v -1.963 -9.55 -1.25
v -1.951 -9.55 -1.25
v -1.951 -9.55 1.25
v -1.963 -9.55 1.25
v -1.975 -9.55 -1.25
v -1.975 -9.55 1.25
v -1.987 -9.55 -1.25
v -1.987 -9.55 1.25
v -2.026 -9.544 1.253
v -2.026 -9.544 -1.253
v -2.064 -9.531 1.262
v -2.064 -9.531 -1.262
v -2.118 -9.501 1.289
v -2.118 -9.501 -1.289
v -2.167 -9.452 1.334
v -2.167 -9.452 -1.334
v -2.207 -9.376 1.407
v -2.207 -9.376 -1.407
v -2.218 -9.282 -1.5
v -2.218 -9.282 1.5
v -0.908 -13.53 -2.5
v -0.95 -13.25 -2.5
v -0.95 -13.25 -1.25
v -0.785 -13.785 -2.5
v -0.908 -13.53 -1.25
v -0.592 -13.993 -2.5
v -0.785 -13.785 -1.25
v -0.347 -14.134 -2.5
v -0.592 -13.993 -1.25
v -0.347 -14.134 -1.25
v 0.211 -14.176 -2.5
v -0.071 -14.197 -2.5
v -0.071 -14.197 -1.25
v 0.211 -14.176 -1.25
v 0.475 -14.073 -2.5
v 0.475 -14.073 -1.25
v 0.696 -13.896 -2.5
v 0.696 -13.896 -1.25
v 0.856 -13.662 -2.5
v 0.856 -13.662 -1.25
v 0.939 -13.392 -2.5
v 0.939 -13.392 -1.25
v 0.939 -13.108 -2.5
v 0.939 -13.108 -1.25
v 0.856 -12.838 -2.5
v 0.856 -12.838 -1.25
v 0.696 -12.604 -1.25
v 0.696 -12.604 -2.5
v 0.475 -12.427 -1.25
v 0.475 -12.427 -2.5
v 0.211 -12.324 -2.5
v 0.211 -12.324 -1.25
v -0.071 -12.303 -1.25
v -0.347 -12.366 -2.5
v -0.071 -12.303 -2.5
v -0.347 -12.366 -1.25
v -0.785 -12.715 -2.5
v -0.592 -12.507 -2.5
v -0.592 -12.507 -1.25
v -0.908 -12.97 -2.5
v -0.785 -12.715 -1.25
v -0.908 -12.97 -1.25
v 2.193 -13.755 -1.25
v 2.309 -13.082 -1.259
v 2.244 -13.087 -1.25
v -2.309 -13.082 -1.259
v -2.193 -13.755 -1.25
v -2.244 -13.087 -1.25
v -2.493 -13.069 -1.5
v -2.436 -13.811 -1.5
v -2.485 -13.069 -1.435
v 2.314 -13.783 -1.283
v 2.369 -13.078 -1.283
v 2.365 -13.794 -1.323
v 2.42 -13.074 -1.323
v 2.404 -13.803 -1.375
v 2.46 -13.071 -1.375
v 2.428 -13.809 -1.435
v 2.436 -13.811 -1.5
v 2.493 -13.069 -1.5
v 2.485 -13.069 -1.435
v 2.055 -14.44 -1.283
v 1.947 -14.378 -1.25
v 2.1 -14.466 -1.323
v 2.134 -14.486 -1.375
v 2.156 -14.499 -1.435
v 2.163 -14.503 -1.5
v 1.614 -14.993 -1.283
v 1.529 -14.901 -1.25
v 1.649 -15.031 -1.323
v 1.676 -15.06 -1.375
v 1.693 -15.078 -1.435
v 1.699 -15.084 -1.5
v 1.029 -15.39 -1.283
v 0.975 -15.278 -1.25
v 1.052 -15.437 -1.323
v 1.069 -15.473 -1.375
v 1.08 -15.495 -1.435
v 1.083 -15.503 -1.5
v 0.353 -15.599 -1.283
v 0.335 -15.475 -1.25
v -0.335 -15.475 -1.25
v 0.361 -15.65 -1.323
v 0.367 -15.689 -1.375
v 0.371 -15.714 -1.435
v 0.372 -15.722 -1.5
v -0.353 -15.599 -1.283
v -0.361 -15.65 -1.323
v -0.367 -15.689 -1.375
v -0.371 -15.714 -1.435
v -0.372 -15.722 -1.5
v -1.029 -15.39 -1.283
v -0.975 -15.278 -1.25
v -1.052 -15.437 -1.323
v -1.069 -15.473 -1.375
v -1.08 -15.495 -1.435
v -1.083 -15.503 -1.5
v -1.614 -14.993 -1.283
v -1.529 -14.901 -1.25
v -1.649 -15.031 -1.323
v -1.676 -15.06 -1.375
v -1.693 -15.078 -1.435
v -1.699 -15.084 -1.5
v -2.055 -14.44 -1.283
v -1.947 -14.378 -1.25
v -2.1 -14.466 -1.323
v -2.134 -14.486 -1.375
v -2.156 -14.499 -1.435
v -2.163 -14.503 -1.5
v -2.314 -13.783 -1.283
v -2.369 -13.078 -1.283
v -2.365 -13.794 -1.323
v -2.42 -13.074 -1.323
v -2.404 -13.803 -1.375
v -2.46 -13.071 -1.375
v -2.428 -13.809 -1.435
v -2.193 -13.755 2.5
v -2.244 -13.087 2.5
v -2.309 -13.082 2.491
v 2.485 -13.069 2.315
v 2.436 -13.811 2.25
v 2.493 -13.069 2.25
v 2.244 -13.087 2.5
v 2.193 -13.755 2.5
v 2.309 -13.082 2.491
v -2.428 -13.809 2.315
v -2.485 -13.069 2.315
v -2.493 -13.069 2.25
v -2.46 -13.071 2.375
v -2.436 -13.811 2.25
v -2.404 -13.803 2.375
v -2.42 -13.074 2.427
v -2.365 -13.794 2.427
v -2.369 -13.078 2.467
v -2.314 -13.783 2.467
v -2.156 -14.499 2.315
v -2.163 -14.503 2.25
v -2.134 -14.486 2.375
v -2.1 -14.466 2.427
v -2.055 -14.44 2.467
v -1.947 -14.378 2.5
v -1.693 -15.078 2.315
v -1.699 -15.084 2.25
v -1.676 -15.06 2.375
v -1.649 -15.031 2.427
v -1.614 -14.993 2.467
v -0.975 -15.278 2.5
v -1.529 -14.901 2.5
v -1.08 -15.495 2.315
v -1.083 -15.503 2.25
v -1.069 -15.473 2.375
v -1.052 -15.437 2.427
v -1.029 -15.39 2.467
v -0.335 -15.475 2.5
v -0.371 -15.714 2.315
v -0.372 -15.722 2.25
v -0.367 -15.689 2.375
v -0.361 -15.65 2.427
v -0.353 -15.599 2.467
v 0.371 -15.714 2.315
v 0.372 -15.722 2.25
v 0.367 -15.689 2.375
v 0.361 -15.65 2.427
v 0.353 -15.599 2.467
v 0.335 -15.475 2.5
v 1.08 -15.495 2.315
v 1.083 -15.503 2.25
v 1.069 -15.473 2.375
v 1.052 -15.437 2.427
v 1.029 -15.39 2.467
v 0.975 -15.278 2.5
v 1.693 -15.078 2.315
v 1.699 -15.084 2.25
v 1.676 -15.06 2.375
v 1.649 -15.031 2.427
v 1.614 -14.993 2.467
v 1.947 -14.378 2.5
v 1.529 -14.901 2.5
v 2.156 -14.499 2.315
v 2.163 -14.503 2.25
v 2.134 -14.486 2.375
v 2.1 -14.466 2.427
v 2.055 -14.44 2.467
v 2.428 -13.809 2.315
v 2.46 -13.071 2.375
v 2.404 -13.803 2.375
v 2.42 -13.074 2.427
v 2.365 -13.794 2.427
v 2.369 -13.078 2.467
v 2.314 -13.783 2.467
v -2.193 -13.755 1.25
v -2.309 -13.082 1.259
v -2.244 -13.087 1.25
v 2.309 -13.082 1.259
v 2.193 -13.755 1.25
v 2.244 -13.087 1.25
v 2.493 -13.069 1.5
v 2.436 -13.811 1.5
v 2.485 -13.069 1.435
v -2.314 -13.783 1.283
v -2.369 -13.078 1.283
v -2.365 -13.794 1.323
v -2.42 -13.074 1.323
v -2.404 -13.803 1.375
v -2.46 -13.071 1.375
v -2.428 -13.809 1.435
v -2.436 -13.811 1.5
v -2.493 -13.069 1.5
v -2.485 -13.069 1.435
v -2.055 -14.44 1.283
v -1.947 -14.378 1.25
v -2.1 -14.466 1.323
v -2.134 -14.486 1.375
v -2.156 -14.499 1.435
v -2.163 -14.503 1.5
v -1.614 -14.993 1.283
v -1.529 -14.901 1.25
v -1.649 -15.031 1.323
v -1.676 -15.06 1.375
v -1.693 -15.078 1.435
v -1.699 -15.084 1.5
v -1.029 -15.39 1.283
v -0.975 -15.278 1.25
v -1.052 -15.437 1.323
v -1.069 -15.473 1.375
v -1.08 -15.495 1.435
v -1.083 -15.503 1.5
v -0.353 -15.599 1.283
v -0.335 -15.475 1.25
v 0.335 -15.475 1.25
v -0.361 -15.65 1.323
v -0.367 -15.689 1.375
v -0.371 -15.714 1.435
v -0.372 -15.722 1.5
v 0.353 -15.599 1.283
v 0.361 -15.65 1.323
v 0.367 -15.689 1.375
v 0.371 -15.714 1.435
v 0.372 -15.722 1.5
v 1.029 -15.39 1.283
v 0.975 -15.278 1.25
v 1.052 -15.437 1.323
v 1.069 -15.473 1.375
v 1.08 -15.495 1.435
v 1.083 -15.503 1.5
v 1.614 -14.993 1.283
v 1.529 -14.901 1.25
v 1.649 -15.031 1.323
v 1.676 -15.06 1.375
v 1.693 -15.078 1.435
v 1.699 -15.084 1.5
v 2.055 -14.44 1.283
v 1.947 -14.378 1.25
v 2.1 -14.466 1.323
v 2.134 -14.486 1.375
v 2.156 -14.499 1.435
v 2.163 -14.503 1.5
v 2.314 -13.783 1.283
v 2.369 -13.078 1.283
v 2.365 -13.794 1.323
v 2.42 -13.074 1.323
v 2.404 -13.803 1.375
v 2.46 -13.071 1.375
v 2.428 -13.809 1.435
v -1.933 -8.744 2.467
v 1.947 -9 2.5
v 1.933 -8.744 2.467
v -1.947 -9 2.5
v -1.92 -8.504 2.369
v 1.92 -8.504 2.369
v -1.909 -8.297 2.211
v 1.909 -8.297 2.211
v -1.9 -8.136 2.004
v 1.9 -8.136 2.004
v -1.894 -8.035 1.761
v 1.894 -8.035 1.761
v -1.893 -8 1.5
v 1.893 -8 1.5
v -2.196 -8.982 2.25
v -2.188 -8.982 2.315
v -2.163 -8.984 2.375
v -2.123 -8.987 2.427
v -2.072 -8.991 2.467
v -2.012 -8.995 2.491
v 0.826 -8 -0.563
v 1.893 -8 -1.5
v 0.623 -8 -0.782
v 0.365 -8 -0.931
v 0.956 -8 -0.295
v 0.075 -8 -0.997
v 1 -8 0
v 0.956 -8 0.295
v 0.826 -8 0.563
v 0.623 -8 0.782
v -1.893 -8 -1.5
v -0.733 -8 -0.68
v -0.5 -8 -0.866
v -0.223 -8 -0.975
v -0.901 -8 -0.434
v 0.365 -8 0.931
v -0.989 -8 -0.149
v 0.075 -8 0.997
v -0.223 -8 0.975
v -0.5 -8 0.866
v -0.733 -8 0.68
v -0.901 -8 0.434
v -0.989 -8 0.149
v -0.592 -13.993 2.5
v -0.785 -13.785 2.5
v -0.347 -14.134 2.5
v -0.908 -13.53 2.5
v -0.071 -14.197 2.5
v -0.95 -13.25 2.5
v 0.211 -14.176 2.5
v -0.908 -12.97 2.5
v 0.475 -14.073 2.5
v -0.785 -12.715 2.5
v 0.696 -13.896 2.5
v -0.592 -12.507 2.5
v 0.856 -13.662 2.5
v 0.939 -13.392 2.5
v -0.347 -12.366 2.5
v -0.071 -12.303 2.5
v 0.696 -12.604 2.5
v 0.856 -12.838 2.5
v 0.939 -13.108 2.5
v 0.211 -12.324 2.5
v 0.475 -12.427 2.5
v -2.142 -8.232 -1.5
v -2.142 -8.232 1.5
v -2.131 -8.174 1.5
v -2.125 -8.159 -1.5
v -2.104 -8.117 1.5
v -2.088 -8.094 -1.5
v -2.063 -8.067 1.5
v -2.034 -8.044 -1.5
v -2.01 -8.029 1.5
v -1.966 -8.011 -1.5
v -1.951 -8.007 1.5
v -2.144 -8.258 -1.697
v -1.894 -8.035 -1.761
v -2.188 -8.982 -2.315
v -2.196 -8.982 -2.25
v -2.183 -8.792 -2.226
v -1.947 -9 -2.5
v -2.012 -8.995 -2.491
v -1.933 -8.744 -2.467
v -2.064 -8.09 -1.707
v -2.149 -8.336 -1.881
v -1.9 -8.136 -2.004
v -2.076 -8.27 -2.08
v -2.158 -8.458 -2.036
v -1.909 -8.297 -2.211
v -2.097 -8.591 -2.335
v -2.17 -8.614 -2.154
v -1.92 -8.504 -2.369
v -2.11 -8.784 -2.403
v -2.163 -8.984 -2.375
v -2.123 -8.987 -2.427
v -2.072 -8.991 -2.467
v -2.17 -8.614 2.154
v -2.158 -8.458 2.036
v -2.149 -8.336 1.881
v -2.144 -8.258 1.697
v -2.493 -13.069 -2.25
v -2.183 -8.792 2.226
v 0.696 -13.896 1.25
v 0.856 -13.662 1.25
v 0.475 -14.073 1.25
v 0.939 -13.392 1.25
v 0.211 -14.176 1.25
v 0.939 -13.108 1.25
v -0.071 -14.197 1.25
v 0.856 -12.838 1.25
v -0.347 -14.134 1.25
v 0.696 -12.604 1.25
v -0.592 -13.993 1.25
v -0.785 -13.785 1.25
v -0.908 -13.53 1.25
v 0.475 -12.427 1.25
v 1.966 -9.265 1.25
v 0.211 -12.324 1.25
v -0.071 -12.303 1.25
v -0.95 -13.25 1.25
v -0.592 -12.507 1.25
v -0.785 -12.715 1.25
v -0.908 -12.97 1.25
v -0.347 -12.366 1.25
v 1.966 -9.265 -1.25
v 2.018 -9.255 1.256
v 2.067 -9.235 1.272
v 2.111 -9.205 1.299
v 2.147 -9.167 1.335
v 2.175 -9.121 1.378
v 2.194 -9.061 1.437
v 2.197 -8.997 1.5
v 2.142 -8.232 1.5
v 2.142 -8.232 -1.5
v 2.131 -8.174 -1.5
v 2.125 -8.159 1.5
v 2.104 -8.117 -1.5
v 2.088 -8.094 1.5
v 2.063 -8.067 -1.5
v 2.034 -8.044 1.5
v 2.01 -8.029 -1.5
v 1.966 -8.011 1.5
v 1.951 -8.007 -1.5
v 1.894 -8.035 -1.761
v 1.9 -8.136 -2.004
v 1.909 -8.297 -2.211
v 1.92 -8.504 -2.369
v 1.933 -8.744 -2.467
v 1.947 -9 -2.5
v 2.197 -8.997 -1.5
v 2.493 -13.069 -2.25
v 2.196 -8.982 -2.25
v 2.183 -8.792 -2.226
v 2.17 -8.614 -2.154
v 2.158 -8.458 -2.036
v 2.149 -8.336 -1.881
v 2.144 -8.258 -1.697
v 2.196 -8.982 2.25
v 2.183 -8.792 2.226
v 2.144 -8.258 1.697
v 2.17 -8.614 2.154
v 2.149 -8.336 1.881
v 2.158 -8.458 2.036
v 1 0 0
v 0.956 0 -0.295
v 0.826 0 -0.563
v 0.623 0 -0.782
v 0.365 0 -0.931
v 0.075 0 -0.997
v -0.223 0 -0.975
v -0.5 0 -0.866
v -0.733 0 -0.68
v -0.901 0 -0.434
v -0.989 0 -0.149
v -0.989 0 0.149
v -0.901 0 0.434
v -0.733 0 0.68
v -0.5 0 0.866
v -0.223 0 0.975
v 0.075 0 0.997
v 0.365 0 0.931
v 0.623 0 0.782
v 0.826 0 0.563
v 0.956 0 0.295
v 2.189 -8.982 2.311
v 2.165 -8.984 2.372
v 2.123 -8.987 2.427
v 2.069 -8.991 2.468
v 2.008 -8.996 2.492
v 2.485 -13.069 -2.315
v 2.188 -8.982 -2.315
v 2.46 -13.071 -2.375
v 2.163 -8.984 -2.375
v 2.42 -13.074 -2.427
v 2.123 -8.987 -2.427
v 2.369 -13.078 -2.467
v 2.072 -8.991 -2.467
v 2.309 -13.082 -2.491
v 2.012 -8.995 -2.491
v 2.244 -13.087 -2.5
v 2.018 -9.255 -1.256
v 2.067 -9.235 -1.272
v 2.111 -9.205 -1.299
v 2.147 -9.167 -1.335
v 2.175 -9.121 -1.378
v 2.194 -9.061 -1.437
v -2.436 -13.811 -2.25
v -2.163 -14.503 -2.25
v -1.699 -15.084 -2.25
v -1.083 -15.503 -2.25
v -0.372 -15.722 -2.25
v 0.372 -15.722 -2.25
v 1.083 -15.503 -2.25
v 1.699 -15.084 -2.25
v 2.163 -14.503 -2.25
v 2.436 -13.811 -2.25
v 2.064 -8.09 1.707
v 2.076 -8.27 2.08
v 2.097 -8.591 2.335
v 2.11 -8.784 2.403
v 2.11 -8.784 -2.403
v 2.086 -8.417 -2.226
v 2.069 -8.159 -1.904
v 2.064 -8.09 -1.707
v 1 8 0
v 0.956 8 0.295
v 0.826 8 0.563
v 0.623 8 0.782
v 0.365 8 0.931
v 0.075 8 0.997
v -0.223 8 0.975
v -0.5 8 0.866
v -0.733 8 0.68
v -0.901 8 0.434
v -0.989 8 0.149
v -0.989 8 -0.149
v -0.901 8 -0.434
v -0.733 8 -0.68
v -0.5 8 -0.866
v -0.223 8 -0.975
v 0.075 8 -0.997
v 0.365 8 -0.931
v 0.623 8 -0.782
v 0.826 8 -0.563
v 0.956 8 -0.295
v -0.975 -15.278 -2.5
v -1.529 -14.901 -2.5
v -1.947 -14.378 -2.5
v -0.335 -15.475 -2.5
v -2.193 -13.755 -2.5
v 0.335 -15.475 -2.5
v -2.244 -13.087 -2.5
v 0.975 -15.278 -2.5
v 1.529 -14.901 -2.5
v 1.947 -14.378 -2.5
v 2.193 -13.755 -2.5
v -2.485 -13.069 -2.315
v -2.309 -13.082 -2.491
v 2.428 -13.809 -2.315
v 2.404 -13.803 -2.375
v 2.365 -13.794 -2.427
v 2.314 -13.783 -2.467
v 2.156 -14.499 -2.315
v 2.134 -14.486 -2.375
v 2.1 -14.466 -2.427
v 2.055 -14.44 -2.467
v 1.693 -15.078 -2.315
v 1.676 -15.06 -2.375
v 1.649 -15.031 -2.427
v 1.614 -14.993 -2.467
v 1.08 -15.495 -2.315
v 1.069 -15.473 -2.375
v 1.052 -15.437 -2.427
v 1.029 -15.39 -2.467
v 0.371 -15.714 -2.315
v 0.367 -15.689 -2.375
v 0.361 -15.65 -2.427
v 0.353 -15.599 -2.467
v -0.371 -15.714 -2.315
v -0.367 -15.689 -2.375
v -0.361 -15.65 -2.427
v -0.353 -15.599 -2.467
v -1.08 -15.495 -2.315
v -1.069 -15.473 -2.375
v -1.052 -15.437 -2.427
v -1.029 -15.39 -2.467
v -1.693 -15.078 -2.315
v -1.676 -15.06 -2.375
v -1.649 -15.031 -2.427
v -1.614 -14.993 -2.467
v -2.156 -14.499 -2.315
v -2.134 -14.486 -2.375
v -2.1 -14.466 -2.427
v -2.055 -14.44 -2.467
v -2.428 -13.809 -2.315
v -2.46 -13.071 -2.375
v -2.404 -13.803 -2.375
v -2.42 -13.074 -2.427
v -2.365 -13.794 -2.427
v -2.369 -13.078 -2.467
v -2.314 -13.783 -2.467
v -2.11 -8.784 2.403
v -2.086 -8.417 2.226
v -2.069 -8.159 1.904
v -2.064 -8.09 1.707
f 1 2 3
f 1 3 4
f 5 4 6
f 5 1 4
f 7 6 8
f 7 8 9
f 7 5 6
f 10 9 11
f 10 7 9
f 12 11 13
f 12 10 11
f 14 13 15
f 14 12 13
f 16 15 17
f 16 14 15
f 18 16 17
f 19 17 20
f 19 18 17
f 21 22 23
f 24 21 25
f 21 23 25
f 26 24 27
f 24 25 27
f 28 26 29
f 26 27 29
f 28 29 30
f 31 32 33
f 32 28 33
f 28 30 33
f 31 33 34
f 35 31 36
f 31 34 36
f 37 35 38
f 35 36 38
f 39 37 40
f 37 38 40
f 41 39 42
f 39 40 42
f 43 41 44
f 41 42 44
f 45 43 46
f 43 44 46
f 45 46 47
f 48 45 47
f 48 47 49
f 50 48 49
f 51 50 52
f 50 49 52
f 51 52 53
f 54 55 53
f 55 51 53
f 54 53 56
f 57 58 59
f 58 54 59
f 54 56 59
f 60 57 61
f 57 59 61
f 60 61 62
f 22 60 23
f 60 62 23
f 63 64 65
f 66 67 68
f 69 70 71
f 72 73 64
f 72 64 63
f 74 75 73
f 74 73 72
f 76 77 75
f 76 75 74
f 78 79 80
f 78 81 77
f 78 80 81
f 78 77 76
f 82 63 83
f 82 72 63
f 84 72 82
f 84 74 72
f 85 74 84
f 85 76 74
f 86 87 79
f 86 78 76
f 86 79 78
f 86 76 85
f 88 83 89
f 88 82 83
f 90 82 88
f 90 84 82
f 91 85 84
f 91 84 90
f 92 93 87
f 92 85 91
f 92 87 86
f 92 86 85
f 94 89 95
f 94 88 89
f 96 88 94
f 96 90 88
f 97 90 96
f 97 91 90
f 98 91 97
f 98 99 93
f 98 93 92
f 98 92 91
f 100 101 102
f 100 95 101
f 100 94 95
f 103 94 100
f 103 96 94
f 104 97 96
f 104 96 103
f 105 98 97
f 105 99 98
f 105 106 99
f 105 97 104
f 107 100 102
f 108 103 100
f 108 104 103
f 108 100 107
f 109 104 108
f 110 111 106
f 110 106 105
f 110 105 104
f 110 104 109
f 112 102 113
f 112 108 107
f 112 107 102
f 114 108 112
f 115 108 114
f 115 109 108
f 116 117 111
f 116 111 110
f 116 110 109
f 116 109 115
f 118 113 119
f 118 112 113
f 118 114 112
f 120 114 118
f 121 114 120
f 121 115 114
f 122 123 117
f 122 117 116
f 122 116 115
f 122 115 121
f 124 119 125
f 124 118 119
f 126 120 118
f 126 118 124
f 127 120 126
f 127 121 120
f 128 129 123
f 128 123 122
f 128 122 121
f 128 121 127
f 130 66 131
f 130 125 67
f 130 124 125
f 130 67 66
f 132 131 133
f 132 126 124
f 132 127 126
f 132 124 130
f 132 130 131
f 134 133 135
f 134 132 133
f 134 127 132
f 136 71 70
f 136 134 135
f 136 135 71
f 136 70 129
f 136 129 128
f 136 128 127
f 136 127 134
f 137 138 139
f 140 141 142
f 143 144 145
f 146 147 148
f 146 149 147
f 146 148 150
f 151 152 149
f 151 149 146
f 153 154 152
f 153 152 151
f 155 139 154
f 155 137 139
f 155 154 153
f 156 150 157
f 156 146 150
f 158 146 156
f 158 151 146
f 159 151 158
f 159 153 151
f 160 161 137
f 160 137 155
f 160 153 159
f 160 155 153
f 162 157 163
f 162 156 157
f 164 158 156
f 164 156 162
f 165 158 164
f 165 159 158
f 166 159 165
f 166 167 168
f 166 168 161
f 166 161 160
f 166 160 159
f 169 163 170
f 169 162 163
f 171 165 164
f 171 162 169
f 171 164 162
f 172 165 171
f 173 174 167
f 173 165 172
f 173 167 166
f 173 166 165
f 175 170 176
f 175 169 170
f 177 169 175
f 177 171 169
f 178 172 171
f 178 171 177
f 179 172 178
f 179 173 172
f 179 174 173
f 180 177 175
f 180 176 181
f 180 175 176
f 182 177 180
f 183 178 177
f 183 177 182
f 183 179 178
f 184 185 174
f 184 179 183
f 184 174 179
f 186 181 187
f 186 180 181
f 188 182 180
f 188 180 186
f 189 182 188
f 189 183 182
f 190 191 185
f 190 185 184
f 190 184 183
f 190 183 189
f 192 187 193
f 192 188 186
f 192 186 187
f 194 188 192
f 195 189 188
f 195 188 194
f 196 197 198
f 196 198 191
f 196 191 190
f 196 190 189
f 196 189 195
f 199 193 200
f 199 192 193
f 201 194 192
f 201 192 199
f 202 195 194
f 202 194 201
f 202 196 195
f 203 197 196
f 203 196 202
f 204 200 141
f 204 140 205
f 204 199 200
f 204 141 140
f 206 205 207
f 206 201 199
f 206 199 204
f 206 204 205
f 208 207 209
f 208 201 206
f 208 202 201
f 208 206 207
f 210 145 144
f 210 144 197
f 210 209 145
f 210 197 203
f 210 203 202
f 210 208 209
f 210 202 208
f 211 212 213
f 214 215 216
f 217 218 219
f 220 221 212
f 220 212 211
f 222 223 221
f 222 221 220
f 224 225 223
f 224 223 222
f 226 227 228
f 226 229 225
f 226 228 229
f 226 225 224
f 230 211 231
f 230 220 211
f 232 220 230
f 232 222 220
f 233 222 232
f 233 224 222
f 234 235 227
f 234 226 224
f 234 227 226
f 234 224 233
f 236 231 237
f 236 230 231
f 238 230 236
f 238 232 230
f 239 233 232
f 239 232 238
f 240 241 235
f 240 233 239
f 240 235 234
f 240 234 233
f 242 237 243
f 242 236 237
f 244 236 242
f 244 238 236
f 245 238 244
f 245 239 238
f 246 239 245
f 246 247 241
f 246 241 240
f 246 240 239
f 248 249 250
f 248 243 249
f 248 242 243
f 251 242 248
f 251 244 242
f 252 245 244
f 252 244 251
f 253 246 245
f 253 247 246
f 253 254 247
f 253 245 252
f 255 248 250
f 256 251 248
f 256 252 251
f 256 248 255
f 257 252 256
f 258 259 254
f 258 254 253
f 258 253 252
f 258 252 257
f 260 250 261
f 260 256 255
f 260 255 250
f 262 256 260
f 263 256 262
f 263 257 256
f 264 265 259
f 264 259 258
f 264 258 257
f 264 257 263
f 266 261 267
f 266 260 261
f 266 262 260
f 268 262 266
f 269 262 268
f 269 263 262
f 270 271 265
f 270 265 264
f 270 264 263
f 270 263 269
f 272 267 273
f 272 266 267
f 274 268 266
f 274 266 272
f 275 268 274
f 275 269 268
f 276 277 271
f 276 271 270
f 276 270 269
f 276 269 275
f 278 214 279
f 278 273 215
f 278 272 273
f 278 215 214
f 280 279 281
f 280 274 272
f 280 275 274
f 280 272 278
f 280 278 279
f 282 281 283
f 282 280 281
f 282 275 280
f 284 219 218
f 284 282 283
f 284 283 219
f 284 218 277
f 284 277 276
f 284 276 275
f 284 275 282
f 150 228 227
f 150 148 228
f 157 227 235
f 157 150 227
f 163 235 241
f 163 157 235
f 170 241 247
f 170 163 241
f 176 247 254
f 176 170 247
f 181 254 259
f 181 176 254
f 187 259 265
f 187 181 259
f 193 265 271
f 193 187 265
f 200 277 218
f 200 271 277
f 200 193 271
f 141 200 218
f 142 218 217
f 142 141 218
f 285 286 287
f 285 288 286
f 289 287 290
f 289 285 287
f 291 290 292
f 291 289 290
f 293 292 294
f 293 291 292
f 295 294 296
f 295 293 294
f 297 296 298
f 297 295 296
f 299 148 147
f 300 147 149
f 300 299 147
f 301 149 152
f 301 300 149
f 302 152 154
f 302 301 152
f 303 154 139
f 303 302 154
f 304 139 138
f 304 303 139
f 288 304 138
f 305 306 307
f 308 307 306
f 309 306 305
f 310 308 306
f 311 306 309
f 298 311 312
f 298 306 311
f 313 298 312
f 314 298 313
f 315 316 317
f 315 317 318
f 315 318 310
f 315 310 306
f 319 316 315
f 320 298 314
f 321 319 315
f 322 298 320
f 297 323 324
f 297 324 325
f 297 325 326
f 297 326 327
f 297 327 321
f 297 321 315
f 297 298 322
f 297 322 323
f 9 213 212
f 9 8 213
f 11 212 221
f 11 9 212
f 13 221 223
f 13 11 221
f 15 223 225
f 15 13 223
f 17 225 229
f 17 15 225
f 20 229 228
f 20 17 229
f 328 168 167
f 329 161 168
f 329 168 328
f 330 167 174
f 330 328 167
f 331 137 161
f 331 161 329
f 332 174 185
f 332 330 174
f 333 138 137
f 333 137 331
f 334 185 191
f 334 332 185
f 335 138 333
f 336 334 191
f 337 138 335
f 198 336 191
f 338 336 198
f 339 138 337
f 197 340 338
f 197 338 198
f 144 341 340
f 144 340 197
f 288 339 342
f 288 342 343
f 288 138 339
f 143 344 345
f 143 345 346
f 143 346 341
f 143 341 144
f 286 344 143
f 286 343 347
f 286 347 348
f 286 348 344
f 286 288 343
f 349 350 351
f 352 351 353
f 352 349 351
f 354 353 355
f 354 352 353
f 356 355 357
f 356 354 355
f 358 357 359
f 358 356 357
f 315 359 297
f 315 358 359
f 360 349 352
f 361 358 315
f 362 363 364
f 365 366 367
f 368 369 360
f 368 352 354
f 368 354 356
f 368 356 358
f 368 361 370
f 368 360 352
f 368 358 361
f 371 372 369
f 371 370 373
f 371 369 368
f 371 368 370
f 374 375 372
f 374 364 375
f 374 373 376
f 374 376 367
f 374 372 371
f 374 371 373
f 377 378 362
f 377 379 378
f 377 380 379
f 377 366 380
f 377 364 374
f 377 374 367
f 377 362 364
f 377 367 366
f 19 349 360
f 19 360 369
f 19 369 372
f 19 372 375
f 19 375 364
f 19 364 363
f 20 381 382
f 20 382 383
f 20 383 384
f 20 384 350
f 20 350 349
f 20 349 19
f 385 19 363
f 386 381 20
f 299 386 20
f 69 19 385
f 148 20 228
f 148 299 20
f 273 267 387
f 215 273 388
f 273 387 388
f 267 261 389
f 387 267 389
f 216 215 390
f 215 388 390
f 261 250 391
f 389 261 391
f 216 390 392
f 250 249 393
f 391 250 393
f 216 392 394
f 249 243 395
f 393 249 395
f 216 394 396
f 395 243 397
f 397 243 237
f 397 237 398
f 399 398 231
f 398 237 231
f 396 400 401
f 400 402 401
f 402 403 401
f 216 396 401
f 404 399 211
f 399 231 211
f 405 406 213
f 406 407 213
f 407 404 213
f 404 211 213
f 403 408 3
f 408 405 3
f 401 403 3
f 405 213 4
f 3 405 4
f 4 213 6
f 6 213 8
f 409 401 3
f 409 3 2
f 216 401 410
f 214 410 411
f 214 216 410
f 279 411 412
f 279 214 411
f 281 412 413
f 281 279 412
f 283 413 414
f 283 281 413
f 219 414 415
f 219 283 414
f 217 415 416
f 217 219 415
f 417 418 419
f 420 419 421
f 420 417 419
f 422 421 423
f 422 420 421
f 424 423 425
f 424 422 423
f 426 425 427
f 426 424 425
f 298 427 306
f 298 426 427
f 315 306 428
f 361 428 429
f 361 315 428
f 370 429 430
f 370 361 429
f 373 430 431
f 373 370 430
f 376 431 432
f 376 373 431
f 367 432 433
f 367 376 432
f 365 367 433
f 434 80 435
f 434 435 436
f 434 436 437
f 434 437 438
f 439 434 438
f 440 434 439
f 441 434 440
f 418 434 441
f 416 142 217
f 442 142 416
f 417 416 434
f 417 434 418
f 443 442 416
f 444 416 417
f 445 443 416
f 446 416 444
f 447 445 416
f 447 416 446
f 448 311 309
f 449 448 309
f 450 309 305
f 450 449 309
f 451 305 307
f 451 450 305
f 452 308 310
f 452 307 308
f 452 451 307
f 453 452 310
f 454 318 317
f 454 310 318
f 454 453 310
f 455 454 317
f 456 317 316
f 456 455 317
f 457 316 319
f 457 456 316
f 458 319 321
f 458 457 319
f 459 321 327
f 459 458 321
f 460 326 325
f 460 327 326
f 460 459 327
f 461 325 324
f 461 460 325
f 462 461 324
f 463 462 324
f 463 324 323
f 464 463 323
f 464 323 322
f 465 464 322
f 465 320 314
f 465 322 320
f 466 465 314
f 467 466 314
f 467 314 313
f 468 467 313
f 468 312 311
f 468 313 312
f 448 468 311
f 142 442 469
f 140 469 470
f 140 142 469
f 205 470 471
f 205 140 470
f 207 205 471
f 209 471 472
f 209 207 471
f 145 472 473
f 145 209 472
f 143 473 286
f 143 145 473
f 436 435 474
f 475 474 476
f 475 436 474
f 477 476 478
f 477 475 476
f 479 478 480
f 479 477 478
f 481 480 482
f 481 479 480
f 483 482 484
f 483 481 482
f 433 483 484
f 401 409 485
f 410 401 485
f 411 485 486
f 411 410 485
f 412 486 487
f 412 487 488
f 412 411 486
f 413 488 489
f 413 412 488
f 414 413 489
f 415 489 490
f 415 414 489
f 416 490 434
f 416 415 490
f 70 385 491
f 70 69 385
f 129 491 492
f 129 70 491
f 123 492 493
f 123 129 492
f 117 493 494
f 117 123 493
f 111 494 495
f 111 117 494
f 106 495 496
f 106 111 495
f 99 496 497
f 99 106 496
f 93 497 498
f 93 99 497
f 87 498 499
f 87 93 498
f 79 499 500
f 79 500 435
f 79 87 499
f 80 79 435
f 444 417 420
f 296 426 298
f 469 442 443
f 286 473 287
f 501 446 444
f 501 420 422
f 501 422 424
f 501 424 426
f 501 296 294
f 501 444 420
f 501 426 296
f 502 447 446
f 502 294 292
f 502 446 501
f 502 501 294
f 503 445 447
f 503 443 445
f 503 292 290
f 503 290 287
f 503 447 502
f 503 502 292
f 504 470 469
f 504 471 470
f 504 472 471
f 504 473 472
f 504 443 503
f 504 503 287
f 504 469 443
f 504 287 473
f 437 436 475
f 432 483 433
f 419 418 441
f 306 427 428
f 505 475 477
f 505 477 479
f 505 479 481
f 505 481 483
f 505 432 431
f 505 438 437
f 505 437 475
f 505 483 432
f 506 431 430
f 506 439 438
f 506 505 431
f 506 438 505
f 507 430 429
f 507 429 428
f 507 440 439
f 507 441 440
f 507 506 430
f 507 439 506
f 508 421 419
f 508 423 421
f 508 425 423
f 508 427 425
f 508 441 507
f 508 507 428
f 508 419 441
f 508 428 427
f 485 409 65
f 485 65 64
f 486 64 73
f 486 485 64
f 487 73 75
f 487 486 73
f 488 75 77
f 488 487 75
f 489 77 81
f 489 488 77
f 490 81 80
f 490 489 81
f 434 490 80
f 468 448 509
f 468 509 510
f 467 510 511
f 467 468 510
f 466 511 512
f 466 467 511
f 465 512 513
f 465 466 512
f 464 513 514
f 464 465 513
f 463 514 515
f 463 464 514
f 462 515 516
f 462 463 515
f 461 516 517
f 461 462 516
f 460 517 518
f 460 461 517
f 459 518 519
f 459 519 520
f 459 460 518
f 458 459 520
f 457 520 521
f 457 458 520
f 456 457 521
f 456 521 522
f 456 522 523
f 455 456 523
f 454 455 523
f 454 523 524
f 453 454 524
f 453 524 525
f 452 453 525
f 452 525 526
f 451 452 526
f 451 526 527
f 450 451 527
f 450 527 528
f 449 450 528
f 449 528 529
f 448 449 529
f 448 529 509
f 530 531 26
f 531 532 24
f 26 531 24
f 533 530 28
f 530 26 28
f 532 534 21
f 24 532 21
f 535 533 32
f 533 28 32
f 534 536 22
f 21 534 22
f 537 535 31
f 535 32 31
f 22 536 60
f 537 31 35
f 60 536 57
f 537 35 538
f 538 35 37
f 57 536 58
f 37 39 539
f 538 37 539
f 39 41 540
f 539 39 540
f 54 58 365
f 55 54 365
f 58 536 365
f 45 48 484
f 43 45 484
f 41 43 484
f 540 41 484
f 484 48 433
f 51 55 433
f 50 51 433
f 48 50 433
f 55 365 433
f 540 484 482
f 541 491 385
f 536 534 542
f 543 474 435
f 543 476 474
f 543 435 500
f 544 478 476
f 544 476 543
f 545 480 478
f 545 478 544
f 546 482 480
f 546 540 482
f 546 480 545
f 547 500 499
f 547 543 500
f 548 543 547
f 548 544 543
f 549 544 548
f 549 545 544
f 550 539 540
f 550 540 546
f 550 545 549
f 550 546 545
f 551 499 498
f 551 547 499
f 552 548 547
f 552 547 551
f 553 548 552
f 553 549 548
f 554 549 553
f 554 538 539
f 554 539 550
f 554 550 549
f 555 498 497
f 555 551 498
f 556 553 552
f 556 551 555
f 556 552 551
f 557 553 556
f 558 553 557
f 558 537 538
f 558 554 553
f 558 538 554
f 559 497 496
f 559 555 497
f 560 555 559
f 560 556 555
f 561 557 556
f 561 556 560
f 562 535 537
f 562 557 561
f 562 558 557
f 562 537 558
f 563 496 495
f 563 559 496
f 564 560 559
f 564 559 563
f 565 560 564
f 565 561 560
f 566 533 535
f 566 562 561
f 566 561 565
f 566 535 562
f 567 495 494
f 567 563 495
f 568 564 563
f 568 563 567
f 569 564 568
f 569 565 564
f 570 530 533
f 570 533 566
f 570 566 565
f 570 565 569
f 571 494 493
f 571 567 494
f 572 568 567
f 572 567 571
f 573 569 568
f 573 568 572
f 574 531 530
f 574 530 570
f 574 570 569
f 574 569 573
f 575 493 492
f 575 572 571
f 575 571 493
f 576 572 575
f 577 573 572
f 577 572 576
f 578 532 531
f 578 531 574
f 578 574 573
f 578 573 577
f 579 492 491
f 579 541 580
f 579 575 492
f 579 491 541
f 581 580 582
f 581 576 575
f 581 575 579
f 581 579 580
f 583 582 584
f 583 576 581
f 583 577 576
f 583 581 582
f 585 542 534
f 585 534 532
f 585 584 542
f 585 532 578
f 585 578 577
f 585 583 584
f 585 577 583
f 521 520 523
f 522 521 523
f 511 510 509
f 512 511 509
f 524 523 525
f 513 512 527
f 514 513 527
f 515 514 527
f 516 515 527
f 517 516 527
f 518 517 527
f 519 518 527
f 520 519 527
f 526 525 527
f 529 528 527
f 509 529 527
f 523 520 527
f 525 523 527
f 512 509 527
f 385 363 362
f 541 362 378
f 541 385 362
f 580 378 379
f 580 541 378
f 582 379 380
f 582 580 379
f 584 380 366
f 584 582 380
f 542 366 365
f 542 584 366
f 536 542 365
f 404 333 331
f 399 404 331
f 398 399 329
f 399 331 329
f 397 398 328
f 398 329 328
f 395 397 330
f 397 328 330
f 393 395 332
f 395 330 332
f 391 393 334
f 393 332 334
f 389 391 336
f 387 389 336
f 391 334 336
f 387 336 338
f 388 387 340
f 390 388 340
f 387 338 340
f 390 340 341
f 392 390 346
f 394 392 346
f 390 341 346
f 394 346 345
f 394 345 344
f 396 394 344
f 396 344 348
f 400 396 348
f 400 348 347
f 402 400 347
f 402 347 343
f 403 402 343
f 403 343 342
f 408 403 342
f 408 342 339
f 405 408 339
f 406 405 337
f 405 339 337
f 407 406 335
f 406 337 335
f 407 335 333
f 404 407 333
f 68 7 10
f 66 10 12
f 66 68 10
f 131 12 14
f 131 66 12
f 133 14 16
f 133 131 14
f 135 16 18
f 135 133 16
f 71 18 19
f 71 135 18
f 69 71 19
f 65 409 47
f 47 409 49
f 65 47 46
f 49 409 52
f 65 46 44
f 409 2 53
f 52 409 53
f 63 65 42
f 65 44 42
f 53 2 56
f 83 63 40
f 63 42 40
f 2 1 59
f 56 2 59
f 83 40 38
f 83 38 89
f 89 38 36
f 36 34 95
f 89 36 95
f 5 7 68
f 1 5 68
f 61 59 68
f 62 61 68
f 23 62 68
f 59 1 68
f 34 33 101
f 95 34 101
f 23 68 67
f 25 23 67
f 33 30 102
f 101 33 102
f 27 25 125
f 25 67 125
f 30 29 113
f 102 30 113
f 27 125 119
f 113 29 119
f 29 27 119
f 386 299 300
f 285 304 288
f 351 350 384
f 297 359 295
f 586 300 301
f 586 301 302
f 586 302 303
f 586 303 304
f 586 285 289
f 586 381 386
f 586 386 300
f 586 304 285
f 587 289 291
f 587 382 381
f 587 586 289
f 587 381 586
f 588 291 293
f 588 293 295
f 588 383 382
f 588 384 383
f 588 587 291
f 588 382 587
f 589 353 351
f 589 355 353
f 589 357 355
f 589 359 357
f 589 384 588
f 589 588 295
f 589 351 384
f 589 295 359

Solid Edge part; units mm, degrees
sketch "Sketch1" plane through (0, 0, 0) normal (0, -1, 0) x (1, 0, 0)
  circle A0 centre (0, 0) radius 1
extrude "Protrusion1" add sketch "Sketch1" along normal mid plane 16
sketch "Sketch2" plane through (0, -8, 0) normal (0, 0, -1) x (-1, 0, 0)
  circle A0 centre (0, -5.25) radius 0.95
  line L0 (2.125, 0) -> (2.4934, -5.0688)
  arc A1 (2.4934, -5.0688) -> (-2.4934, -5.0688) centre (0, -5.25) cw
  line L1 (-2.4934, -5.0688) -> (-2.125, 0)
  line L2 (-2.125, 0) -> (2.125, 0)
extrude "ExtrudedProtrusion_2" add sketch "Sketch2" along normal mid plane 5
sketch "Sketch3" plane through (2.3092, -10.5344, 0) normal (0.9973689, 0.0724935, 0) x (-0.0724935, 0.9973689, 0)
  line L0 (1.2911, -1.25) -> (-5.2803, -1.25)
  line L1 (-5.2803, -1.25) -> (-5.2803, 1.25)
  line L2 (-5.2803, 1.25) -> (1.2911, 1.25)
  line L3 (1.2911, 1.25) -> (1.2911, -1.25)
extrude "Cutout1" cut sketch "Sketch3" along normal through all and the other way through all
fillet "Round_1" radius 1 2 edges at (0, -8, -2.5) (0, -8, 2.5)
fillet "Round_1" radius 0.25 15 edges at (-2.3092, -10.5344, -2.5) (0, -15.75, -2.5) (2.3092, -10.5344, -2.5) (-2.125, -8, 0) (-2.3092, -10.5344, 2.5) (0, -15.75, 2.5) (2.3092, -10.5344, 2.5) (2.125, -8, 0) (2.2156, -9.2467, 0) (2.3545, -11.1577, -1.25) (-2.3663, -11.3196, -1.25) (2.3545, -11.1577, 1.25) (0, -15.75, 1.25) (-2.3663, -11.3196, 1.25) (-2.2392, -9.5705, 0)
properties material "Steel"
